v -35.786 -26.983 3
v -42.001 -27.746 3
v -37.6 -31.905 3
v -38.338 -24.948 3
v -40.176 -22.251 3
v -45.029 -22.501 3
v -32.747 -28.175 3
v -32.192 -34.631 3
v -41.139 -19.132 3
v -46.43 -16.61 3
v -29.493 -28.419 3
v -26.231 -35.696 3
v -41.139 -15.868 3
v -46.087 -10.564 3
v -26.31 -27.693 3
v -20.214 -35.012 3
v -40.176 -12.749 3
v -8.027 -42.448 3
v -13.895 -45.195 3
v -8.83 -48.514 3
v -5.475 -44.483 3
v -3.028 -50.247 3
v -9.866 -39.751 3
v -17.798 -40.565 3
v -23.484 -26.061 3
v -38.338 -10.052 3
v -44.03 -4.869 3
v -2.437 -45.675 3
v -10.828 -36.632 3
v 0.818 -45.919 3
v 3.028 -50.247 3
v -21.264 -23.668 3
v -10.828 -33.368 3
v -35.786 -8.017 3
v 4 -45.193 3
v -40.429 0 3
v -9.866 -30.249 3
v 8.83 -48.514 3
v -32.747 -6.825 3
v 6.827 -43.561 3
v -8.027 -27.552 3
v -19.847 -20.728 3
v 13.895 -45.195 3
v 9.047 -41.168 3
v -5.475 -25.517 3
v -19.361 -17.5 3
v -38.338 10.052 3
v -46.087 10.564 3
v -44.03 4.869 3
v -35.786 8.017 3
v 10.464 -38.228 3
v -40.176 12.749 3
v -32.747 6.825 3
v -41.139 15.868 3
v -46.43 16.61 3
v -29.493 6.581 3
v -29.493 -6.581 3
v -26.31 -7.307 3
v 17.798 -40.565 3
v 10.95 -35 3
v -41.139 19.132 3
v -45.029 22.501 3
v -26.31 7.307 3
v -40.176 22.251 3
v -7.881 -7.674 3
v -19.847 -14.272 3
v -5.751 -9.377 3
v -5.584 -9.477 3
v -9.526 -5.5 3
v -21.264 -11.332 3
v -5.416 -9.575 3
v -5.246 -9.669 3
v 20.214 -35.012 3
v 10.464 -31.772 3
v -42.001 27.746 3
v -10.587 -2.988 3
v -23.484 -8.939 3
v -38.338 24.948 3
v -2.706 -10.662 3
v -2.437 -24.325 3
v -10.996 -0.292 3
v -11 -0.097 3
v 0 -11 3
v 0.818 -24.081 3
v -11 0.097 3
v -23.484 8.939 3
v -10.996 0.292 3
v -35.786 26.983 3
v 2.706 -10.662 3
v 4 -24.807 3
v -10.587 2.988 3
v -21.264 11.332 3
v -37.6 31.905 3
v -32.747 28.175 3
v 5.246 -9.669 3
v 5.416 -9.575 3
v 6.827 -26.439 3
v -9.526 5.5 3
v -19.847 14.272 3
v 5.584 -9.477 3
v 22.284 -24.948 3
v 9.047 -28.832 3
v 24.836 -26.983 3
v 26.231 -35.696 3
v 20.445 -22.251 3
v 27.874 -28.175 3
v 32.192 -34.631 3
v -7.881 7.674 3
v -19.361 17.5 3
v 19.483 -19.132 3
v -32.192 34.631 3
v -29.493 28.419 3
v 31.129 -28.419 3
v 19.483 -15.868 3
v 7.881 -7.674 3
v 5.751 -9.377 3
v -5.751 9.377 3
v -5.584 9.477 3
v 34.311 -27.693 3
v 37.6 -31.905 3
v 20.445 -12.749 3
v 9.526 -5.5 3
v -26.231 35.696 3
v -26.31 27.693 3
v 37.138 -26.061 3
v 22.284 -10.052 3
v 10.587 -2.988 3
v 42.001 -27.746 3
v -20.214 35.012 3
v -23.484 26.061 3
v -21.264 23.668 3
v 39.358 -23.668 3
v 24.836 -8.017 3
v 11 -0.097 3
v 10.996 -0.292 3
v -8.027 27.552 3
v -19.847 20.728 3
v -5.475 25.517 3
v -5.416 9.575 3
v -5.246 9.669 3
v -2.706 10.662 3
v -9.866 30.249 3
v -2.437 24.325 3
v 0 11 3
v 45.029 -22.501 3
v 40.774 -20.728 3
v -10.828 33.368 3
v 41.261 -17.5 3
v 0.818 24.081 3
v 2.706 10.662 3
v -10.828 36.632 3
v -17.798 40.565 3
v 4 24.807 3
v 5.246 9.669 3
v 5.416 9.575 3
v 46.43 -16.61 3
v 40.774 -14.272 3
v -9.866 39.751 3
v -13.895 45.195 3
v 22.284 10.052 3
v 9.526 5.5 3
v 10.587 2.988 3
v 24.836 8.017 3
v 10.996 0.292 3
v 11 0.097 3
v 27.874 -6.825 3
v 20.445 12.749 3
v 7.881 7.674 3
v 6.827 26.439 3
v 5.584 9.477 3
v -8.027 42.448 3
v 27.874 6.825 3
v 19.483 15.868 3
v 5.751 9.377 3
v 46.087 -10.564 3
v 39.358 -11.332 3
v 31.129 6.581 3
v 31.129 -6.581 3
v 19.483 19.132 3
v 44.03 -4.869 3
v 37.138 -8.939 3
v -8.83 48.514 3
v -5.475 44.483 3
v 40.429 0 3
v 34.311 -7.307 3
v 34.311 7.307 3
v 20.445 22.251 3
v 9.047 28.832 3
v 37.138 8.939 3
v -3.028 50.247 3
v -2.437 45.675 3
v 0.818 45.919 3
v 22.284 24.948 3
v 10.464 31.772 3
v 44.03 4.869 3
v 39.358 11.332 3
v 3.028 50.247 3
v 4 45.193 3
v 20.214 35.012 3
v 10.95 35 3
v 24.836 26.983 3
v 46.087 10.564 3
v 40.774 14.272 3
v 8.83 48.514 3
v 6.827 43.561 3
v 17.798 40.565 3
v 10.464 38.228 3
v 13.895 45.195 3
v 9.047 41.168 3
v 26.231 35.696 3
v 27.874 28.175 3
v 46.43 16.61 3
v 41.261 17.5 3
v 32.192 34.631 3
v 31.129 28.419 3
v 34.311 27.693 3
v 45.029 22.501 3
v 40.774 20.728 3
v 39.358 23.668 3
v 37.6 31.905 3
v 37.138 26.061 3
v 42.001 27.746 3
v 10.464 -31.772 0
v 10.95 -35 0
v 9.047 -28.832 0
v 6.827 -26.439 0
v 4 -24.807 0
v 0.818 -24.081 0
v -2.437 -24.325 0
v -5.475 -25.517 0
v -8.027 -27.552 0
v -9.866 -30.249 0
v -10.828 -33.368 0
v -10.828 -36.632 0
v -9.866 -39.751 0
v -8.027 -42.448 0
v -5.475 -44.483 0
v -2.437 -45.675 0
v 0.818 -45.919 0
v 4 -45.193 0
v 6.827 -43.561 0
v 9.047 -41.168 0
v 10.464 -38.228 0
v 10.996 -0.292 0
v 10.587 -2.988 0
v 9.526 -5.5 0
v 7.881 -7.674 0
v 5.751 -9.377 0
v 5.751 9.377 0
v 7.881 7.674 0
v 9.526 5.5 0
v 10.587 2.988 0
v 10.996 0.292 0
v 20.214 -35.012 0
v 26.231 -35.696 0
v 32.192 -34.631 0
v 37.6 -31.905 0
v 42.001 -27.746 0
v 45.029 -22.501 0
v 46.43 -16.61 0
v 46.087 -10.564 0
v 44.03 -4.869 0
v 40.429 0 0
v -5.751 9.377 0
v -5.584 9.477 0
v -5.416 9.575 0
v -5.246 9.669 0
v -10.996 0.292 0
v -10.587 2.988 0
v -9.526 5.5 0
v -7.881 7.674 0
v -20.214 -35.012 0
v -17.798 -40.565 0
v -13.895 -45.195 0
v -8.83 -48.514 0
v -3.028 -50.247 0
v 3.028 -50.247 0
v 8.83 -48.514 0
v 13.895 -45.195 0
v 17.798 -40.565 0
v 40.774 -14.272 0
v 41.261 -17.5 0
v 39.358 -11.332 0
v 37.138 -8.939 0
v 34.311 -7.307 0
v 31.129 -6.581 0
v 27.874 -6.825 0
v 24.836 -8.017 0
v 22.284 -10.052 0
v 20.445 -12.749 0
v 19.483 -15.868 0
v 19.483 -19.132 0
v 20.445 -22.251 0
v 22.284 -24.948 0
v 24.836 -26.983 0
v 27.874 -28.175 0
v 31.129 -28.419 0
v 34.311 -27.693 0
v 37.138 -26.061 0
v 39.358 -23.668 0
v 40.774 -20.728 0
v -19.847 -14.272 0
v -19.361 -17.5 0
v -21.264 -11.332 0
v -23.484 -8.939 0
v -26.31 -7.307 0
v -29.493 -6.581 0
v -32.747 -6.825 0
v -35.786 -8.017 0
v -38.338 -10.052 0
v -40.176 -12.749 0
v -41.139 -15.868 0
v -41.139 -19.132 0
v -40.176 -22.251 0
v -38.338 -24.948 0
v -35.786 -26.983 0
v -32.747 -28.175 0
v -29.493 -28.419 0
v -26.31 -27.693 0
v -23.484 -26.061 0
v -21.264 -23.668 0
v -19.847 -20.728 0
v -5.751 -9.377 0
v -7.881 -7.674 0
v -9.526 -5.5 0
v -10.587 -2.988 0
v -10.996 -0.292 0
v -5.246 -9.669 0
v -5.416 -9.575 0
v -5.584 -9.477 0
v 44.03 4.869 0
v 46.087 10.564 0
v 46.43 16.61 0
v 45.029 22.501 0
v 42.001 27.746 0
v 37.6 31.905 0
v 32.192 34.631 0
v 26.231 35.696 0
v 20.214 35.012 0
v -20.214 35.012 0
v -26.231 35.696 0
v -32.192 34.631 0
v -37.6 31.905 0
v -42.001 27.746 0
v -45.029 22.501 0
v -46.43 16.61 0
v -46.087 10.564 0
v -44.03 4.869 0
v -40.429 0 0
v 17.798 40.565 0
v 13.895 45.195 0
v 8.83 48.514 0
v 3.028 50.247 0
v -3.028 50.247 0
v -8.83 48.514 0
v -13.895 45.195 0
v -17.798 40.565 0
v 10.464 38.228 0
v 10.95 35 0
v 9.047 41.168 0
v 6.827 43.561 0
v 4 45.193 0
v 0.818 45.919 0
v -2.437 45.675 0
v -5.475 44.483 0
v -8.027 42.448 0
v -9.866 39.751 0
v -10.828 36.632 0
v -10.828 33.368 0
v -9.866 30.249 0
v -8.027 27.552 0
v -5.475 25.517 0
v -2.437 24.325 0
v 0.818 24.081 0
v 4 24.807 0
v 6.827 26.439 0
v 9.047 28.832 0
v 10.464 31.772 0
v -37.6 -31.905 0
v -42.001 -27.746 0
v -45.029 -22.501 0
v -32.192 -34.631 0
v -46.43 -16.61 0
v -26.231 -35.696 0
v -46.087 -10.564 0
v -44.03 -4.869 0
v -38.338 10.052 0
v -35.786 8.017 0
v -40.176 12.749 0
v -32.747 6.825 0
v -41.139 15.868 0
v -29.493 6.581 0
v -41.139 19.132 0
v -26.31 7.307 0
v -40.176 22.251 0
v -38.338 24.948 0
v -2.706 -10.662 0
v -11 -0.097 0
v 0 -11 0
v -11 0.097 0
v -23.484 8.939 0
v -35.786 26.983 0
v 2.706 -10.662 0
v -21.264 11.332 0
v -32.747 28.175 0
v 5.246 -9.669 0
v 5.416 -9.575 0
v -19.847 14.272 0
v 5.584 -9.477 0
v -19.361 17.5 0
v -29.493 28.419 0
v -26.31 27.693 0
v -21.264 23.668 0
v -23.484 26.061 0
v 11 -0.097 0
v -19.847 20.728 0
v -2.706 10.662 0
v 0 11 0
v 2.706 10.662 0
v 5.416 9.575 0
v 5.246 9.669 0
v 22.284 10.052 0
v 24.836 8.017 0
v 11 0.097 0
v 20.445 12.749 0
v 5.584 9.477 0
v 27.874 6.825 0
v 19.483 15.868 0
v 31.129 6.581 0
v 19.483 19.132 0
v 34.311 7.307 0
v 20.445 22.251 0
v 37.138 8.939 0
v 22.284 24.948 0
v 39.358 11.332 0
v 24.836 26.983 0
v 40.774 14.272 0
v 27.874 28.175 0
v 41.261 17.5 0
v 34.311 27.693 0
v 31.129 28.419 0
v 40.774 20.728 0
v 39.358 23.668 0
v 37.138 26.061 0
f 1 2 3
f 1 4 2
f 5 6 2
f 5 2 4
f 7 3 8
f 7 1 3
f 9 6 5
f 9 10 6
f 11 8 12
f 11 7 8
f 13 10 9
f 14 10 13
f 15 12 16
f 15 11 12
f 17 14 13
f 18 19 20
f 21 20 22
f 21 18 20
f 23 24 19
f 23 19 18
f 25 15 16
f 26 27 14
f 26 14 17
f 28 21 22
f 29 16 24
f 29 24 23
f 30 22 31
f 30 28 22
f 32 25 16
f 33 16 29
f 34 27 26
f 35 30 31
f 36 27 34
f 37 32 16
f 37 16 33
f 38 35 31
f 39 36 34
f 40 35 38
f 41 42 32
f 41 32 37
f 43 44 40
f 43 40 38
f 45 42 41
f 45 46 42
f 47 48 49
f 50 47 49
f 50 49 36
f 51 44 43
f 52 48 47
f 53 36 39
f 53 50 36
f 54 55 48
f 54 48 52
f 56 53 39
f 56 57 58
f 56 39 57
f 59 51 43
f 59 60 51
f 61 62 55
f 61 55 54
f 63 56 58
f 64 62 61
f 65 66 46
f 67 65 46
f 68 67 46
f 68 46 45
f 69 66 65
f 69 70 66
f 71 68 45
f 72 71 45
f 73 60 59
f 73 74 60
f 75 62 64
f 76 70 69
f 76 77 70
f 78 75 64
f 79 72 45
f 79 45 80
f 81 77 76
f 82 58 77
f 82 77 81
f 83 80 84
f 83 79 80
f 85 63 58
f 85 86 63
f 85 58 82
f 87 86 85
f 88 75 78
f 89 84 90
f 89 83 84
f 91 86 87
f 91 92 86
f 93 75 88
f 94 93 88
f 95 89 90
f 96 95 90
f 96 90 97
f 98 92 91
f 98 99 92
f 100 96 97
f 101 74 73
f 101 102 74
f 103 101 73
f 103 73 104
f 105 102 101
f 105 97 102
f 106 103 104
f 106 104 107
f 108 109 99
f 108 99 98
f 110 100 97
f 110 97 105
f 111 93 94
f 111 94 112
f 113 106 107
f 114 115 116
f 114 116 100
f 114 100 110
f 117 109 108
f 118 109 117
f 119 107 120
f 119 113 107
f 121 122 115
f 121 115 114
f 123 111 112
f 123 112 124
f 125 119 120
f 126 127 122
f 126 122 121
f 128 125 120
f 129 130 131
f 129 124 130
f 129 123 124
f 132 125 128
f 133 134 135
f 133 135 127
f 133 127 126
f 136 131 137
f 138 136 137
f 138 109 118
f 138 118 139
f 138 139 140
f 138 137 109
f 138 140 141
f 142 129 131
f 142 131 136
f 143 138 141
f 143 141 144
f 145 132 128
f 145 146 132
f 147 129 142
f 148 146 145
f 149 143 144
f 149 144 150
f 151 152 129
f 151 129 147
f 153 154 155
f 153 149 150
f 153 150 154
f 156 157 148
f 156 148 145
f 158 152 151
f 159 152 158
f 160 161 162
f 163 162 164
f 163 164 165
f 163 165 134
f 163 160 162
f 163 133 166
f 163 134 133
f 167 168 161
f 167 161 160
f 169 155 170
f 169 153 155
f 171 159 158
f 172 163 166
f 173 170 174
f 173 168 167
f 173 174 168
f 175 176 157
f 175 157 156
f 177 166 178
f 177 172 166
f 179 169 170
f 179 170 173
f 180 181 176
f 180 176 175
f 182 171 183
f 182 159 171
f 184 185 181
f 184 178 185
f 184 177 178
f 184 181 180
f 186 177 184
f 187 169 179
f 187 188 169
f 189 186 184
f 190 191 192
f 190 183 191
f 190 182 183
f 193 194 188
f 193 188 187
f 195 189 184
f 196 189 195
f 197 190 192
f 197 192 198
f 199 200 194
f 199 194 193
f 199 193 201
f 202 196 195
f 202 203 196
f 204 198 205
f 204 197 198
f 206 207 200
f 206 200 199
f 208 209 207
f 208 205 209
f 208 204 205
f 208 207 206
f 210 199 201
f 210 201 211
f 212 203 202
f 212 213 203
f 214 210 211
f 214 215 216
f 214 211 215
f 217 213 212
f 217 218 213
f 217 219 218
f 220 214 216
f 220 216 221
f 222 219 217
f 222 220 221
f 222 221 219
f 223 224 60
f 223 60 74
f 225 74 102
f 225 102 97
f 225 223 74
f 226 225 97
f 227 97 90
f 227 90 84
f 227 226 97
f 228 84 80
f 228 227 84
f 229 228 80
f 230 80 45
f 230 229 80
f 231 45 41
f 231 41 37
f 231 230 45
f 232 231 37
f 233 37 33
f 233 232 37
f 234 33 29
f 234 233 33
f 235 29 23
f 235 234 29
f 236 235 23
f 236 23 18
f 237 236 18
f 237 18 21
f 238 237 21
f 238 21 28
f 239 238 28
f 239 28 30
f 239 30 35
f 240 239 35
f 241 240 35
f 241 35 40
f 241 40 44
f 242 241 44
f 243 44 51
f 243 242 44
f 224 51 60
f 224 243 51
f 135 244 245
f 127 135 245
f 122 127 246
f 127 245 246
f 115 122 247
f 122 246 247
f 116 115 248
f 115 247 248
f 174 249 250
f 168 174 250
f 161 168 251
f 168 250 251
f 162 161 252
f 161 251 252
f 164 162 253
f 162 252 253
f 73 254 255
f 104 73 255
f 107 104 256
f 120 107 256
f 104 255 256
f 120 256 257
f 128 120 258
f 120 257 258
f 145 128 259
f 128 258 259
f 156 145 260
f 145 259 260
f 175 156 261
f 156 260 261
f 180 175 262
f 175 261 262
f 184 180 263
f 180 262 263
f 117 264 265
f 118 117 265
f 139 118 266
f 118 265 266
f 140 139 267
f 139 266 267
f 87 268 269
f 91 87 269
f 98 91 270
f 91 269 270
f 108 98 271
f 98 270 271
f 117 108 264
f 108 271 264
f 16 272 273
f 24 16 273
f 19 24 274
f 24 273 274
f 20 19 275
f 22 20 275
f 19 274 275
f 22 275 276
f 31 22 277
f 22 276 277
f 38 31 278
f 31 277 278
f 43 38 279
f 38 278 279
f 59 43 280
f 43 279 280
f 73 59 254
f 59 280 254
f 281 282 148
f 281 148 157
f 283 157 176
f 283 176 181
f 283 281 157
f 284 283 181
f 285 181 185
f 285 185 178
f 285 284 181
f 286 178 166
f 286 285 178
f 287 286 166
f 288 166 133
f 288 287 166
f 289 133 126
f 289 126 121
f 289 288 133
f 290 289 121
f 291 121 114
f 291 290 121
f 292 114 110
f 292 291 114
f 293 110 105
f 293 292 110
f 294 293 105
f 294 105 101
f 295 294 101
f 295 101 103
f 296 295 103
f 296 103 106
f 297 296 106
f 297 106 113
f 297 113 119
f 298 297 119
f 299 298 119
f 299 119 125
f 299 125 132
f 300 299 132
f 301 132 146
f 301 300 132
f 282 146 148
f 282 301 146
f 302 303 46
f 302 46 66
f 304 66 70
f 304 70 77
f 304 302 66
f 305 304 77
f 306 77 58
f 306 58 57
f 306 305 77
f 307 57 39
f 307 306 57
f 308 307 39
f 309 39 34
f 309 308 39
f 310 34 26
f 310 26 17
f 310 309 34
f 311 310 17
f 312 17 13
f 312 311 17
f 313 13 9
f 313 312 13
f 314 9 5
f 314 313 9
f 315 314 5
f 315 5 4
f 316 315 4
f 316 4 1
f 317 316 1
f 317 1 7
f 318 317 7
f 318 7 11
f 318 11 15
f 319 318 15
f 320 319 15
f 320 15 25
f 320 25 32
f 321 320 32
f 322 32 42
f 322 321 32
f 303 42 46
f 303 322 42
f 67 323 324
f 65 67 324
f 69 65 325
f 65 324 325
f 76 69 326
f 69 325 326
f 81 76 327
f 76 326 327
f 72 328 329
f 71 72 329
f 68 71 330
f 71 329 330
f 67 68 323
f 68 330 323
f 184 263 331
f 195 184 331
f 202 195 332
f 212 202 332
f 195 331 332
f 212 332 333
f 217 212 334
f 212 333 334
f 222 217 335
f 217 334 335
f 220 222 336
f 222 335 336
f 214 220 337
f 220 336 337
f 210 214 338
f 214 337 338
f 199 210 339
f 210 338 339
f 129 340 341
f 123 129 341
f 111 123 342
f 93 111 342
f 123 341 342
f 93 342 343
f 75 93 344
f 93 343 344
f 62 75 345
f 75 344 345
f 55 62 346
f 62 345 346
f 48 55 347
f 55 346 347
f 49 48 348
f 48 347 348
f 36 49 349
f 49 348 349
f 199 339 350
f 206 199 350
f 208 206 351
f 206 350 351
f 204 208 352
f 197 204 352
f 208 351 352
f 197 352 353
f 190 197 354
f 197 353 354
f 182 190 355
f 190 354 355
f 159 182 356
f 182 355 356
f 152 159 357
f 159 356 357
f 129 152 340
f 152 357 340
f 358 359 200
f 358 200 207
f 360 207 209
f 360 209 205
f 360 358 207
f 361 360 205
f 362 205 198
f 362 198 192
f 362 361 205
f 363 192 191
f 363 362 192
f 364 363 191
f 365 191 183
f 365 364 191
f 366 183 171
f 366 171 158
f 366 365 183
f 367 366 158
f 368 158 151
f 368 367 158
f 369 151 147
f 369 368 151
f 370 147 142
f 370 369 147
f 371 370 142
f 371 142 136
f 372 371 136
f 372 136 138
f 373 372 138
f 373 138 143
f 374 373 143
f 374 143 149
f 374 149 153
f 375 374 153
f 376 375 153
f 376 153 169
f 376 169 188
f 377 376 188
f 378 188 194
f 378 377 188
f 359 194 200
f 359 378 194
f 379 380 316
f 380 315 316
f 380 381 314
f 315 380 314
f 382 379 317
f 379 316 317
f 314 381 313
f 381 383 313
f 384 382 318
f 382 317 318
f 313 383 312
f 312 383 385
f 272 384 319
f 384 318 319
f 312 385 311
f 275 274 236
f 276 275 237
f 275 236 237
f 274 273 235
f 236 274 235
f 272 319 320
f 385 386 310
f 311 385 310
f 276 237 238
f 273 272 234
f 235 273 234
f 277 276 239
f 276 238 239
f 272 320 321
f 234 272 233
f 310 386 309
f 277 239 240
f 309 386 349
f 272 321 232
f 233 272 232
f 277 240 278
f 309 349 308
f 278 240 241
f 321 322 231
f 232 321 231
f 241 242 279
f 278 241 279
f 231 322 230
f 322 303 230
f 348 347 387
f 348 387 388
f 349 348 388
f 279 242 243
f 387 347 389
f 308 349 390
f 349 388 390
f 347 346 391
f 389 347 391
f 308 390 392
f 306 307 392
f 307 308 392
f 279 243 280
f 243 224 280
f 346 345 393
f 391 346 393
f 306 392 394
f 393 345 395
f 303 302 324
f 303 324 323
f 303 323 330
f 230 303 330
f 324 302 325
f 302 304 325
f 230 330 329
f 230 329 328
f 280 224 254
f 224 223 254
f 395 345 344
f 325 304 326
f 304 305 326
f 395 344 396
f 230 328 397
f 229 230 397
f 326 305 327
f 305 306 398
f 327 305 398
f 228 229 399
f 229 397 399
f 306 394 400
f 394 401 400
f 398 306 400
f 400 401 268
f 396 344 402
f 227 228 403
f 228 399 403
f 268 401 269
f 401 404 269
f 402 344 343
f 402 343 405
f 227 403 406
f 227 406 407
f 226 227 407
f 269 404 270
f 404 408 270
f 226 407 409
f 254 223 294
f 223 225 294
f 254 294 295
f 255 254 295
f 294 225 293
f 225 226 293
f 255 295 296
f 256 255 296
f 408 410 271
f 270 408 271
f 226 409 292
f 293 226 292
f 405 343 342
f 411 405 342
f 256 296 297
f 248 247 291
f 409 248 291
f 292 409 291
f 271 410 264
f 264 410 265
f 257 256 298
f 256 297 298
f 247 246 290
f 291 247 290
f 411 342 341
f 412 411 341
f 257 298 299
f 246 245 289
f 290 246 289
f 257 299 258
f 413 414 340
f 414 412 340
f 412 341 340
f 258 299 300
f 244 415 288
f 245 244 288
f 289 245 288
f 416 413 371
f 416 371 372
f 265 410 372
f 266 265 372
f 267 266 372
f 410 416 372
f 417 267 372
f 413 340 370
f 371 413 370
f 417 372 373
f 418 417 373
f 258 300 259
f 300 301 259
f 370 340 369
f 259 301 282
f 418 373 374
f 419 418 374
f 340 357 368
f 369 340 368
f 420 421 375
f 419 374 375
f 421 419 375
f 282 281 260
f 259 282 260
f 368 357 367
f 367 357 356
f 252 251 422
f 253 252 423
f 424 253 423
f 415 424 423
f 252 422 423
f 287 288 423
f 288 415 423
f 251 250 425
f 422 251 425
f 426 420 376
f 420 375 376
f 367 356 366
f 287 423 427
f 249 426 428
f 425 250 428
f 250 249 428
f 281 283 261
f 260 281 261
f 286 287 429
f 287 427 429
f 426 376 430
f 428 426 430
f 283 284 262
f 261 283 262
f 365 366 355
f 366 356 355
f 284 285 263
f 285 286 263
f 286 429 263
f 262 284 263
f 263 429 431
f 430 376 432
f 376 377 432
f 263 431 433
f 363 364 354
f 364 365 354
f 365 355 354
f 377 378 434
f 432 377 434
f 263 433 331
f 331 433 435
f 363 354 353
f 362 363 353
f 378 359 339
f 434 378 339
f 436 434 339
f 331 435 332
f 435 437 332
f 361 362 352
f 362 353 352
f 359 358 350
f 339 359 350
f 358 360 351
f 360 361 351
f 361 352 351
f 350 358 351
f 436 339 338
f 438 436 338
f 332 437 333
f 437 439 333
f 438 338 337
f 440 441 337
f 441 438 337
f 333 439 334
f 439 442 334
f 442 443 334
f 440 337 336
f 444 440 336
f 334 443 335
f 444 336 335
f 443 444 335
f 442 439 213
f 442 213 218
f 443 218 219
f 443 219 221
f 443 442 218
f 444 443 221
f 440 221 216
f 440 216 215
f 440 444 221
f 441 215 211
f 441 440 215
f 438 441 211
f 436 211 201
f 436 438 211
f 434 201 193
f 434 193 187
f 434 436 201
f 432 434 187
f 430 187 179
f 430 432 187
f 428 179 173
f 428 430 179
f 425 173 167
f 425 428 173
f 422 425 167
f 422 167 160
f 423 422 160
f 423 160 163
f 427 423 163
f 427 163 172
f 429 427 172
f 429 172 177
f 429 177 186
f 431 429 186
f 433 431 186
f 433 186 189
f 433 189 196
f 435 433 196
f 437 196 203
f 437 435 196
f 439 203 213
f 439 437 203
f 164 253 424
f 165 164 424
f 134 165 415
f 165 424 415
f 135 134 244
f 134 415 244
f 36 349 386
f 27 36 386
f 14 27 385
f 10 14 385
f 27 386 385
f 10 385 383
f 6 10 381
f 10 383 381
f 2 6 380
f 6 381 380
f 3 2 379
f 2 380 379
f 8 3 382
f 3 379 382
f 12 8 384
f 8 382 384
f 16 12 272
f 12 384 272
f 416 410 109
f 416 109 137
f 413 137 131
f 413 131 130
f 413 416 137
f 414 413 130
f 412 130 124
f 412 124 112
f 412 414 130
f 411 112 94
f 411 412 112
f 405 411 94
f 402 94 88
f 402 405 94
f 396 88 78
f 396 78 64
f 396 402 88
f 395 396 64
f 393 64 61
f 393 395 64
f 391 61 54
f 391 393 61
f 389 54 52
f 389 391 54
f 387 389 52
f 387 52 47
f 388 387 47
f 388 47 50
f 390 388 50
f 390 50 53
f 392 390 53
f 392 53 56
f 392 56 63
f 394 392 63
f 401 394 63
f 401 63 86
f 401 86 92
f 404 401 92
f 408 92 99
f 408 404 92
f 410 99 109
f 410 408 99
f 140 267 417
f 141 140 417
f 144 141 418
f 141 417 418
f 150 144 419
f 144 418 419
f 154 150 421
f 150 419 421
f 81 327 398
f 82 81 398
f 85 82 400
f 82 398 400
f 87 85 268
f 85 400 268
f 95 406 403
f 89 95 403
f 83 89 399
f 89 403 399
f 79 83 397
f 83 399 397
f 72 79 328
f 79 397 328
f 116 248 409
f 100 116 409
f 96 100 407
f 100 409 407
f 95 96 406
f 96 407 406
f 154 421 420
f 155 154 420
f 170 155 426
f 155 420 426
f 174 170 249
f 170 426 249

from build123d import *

# Parameters (mm, degrees)
F0_R     = 10.95
F1_DEPTH = 3


with BuildPart() as f1:
    # F0 (on Top) → F1 (new body)
    with BuildSketch(Plane.XY):
        with BuildLine():
            ThreePointArc((10.996136, 0.291549), (9.526279, 5.5), (5.750556, 9.377159))
            ThreePointArc((5.750556, 9.377159), (5.5, 9.526279), (5.245579, 9.668707))
            ThreePointArc((5.245579, 9.668707), (0, 11), (-5.245579, 9.668707))
            ThreePointArc((-5.245579, 9.668707), (-5.5, 9.526279), (-5.750556, 9.377159))
            ThreePointArc((-5.750556, 9.377159), (-9.526279, 5.5), (-10.996136, 0.291549))
            ThreePointArc((-10.996136, 0.291549), (-11, 0), (-10.996136, -0.291549))
            ThreePointArc((-10.996136, -0.291549), (-9.526279, -5.5), (-5.750556, -9.377159))
            ThreePointArc((-5.750556, -9.377159), (-5.5, -9.526279), (-5.245579, -9.668707))
            ThreePointArc((-5.245579, -9.668707), (0, -11), (5.245579, -9.668707))
            ThreePointArc((5.245579, -9.668707), (5.5, -9.526279), (5.750556, -9.377159))
            ThreePointArc((5.750556, -9.377159), (9.526279, -5.5), (10.996136, -0.291549))
            ThreePointArc((10.996136, -0.291549), (11, 0), (10.996136, 0.291549))
        make_face()
        with BuildLine():
            ThreePointArc((40.428516, 0), (43.705472, 25.233366), (20.214258, 35.012122))
            ThreePointArc((20.214258, 35.012122), (0, 50.466732), (-20.214258, 35.012122))
            ThreePointArc((-20.214258, 35.012122), (-43.705472, 25.233366), (-40.428516, 0))
            ThreePointArc((-40.428516, 0), (-43.705472, -25.233366), (-20.214258, -35.012122))
            ThreePointArc((-20.214258, -35.012122), (0, -50.466732), (20.214258, -35.012122))
            ThreePointArc((20.214258, -35.012122), (43.705472, -25.233366), (40.428516, 0))
        make_face()
        with Locations((-30.310889, -17.5)):
            Circle(F0_R, mode=Mode.SUBTRACT)
        with Locations((0, -35)):
            Circle(F0_R, mode=Mode.SUBTRACT)
        with BuildLine():
            ThreePointArc((5.245579, 9.668707), (5.5, 9.526279), (5.750556, 9.377159))
            ThreePointArc((5.750556, 9.377159), (9.526279, 5.5), (10.996136, 0.291549))
            ThreePointArc((10.996136, 0.291549), (11, 0), (10.996136, -0.291549))
            ThreePointArc((10.996136, -0.291549), (9.526279, -5.5), (5.750556, -9.377159))
            ThreePointArc((5.750556, -9.377159), (5.5, -9.526279), (5.245579, -9.668707))
            ThreePointArc((5.245579, -9.668707), (0, -11), (-5.245579, -9.668707))
            ThreePointArc((-5.245579, -9.668707), (-5.5, -9.526279), (-5.750556, -9.377159))
            ThreePointArc((-5.750556, -9.377159), (-9.526279, -5.5), (-10.996136, -0.291549))
            ThreePointArc((-10.996136, -0.291549), (-11, 0), (-10.996136, 0.291549))
            ThreePointArc((-10.996136, 0.291549), (-9.526279, 5.5), (-5.750556, 9.377159))
            ThreePointArc((-5.750556, 9.377159), (-5.5, 9.526279), (-5.245579, 9.668707))
            ThreePointArc((-5.245579, 9.668707), (0, 11), (5.245579, 9.668707))
        make_face(mode=Mode.SUBTRACT)
        with Locations((30.310889, -17.5)):
            Circle(F0_R, mode=Mode.SUBTRACT)
        with Locations((-30.310889, 17.5)):
            Circle(F0_R, mode=Mode.SUBTRACT)
        with Locations((30.310889, 17.5)):
            Circle(F0_R, mode=Mode.SUBTRACT)
        with Locations((0, 35)):
            Circle(F0_R, mode=Mode.SUBTRACT)
    extrude(amount=F1_DEPTH)


solid = f1.part
